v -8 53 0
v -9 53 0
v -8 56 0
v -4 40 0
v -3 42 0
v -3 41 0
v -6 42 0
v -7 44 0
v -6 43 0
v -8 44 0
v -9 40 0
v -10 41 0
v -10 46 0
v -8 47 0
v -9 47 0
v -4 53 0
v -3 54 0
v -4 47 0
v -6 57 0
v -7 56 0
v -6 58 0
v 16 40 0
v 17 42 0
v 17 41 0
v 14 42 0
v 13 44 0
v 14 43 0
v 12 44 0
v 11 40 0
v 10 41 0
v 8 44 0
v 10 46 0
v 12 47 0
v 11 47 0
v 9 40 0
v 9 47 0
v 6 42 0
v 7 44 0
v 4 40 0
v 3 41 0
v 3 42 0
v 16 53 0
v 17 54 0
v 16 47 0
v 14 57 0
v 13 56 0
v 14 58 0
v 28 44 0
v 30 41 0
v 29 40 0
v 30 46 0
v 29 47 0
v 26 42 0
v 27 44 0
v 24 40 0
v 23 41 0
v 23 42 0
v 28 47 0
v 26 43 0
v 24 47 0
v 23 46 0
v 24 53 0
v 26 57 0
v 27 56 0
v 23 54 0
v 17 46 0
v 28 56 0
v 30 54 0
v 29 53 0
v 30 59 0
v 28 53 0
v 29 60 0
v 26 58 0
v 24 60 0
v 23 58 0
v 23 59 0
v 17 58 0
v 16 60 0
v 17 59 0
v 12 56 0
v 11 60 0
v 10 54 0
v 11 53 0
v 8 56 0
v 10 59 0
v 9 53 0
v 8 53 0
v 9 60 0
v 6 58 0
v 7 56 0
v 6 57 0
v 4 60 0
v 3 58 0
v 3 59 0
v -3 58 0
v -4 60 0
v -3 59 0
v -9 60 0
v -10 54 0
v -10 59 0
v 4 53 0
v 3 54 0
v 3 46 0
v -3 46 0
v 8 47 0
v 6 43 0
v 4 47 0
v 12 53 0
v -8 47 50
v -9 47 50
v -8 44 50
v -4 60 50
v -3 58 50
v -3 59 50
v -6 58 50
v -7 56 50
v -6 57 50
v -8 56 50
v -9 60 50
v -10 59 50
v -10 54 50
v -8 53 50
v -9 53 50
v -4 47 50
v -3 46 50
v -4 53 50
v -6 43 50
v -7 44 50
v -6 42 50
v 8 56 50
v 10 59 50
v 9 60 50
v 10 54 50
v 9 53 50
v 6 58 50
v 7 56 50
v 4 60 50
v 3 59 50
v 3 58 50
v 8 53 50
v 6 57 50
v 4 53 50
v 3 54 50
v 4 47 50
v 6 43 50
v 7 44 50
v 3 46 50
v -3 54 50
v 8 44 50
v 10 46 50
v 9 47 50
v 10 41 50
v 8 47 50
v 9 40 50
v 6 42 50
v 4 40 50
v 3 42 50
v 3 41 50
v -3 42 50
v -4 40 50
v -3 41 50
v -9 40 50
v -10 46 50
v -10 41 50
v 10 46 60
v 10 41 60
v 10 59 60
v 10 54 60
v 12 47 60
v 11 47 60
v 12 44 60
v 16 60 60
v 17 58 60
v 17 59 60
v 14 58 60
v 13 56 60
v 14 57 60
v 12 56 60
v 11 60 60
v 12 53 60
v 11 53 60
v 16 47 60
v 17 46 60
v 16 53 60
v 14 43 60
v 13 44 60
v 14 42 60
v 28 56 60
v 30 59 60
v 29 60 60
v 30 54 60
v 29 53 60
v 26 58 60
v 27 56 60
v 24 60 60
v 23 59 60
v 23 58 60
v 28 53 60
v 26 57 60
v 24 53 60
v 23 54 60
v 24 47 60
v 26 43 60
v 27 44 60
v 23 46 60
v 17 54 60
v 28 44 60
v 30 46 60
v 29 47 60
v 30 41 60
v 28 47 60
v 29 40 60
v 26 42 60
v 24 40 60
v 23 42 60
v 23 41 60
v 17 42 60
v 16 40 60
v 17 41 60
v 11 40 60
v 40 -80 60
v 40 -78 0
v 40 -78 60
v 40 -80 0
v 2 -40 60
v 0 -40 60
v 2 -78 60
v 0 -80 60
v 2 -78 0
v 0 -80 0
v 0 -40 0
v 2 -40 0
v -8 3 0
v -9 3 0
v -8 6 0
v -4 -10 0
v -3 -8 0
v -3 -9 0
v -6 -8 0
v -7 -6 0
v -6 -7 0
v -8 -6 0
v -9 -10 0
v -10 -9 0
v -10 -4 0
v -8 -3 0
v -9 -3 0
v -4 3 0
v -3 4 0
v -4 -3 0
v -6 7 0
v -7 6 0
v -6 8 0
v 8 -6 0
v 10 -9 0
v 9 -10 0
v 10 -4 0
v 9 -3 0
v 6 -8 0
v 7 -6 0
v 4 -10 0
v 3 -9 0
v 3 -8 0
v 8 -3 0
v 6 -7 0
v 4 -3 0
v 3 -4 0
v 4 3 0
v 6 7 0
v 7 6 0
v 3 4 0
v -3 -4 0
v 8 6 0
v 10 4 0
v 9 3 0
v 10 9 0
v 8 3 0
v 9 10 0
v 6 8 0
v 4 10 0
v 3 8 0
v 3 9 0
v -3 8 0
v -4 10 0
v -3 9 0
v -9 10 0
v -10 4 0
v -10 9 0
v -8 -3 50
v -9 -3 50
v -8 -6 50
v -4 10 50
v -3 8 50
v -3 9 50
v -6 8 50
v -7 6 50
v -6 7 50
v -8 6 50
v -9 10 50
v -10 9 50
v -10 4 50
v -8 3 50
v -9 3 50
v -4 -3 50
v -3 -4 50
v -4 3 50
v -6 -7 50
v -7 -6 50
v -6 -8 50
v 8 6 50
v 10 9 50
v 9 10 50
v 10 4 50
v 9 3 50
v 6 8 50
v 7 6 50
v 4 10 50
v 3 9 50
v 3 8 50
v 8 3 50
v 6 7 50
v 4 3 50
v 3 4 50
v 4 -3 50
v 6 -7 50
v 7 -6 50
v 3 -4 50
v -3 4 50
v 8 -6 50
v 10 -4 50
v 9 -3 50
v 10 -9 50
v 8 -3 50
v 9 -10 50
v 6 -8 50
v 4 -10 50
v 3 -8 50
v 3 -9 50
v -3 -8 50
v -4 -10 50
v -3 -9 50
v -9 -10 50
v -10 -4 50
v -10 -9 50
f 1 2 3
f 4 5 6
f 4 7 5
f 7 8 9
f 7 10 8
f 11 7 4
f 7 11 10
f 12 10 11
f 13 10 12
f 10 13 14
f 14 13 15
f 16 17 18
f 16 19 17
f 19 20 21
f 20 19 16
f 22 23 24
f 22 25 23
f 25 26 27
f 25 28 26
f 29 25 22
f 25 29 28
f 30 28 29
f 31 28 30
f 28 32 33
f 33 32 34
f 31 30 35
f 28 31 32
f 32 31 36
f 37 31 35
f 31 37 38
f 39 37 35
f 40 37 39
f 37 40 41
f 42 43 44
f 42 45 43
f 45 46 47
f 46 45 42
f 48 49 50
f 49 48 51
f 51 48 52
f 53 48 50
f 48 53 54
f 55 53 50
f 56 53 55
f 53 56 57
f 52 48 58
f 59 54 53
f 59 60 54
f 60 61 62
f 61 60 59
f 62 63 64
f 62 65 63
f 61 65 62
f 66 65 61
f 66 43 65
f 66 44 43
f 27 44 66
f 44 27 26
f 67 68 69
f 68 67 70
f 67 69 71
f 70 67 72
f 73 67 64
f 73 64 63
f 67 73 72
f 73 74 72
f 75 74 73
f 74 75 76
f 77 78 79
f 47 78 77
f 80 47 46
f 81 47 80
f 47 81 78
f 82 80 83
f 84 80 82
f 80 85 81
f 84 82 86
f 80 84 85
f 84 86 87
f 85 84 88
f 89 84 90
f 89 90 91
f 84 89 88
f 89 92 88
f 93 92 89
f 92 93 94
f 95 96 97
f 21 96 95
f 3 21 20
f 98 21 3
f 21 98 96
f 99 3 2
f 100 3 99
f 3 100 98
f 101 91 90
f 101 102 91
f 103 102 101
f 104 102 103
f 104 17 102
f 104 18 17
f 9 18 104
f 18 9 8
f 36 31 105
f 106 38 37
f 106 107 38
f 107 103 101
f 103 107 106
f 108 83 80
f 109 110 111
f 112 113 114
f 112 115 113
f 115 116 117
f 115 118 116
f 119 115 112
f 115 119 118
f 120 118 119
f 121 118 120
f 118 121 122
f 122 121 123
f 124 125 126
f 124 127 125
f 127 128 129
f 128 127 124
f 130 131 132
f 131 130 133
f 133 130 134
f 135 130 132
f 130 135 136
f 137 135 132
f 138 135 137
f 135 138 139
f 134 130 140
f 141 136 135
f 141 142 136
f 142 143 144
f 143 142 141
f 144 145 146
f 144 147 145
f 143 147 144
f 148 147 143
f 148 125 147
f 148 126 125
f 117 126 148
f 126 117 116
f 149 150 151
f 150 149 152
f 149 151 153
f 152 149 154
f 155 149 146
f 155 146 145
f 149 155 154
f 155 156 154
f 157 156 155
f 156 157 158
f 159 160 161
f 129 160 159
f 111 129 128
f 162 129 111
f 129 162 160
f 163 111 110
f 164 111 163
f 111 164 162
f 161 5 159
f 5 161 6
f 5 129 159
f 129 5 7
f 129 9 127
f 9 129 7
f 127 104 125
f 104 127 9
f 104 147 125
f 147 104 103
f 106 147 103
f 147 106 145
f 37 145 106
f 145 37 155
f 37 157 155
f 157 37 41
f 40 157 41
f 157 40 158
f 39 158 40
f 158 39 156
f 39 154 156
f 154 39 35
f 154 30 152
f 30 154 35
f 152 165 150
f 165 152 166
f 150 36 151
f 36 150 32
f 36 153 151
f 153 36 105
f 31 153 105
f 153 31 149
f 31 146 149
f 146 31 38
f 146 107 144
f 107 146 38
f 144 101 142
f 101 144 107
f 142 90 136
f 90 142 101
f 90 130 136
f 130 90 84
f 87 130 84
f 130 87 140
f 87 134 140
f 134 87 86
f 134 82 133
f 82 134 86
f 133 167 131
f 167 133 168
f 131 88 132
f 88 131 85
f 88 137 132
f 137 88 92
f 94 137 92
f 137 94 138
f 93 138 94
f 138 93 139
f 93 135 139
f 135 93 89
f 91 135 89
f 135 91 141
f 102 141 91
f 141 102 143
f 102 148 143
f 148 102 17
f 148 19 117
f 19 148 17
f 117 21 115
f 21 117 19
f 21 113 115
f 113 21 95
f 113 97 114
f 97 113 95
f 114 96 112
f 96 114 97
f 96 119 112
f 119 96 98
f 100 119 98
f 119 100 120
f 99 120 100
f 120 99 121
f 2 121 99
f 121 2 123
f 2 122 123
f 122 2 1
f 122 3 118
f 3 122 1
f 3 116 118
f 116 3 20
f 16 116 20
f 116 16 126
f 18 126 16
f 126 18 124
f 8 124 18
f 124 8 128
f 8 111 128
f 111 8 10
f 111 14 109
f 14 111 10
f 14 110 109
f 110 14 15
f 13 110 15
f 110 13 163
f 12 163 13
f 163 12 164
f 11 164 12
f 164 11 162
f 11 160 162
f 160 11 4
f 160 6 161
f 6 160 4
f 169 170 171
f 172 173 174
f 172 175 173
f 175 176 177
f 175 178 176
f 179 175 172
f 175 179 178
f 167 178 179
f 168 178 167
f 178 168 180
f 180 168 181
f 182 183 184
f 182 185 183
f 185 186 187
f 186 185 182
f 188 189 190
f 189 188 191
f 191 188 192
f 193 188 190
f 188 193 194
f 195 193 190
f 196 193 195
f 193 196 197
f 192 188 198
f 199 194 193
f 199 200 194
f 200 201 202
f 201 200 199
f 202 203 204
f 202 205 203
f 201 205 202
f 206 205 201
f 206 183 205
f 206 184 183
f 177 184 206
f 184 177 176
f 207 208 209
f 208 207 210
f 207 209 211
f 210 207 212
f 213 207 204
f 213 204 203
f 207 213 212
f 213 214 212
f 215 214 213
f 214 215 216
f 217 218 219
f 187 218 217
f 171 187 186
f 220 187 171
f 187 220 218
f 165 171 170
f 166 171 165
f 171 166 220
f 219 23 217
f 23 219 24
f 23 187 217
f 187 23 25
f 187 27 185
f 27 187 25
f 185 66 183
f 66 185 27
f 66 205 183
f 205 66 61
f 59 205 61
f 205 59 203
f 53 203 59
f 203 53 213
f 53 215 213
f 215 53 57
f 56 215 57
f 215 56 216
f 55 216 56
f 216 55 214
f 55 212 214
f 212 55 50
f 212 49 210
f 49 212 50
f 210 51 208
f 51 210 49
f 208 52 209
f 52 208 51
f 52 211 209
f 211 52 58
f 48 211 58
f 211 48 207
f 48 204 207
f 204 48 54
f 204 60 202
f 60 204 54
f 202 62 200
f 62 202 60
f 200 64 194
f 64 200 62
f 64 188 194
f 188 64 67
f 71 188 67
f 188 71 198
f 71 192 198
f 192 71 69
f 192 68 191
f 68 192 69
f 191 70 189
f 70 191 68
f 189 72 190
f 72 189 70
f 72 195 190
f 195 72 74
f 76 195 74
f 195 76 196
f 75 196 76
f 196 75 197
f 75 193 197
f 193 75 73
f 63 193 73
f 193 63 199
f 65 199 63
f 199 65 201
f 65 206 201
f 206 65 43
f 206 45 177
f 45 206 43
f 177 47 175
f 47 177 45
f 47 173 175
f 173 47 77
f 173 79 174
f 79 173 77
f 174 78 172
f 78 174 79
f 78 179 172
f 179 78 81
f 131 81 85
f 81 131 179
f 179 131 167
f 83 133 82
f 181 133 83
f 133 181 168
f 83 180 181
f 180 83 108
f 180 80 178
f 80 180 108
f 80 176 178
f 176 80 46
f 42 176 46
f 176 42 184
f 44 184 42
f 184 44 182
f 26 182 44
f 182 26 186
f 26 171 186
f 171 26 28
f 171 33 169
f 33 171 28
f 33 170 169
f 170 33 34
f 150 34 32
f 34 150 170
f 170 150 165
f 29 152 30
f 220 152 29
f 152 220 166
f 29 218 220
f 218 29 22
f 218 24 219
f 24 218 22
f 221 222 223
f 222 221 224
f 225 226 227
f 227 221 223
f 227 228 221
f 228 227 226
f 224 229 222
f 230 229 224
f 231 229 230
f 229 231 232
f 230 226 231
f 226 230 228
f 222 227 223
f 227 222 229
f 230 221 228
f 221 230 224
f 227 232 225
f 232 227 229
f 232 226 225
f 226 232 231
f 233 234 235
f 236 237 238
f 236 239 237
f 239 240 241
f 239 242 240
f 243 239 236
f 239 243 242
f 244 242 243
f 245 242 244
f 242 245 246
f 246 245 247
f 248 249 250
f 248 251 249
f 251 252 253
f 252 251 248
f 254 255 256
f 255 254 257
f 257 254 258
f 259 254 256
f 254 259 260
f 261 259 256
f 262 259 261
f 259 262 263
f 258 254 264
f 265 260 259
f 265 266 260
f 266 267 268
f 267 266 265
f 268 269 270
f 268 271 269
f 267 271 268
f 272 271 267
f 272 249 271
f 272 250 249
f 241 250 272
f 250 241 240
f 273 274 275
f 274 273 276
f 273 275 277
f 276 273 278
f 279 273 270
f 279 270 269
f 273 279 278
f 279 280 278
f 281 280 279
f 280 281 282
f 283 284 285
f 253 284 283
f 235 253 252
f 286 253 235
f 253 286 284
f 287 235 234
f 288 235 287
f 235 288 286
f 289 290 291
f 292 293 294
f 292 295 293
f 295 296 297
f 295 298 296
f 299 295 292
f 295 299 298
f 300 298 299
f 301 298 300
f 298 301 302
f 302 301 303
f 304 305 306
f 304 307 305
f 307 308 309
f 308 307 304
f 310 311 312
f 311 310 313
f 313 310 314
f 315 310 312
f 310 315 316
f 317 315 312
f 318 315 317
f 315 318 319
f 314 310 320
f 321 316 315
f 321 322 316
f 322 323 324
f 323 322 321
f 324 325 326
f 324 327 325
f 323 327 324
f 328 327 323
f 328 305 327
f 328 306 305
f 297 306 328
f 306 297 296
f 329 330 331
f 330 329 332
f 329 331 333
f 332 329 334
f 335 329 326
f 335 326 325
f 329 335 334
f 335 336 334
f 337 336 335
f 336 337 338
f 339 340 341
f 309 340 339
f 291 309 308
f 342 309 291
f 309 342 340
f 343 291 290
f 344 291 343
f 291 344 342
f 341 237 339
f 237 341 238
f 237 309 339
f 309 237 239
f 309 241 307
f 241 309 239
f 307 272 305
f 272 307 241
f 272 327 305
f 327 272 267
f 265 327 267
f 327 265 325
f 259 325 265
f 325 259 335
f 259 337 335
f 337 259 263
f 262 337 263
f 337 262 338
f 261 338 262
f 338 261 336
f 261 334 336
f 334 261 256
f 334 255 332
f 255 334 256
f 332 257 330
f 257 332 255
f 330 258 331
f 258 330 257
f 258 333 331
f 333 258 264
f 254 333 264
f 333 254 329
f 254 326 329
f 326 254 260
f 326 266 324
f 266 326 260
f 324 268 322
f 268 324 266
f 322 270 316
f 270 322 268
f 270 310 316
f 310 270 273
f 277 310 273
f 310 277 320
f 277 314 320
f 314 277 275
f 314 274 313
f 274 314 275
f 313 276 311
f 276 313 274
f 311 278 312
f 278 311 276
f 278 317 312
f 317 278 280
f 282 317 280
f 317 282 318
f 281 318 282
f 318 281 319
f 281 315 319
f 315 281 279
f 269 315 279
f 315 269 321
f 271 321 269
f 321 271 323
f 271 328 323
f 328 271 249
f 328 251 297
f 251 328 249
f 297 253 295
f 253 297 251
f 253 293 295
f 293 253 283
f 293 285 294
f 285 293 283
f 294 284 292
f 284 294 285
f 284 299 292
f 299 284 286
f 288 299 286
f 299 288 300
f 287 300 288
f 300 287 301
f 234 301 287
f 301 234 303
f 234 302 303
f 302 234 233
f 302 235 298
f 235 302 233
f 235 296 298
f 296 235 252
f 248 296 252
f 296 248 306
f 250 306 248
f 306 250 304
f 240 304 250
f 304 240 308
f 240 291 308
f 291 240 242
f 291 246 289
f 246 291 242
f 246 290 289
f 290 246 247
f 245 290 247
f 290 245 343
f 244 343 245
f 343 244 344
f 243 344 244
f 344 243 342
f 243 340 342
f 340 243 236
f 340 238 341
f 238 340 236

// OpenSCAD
// file: ../utils.scad
//Utils
include <config.scad>;

module MOV(mov)
{
    translate(mov)
        children();
}

module ROT(rot)
{
    rotate(rot)
        children();
}

module ROT_MOV(rot, mov)
{
    rotate(rot) 
        translate(mov)
            children();
}

module MOV_ROT(mov, rot)
{
    translate(mov)
        rotate(rot) 
            children();
}

function MULT2MV (m, v) = 
[
    m[0][0]*v[0] + m[0][1]*v[1],
    m[1][0]*v[0] + m[1][1]*v[1],
];

function ROTM2(angle) = 
[
    [cos(angle), -sin(angle)],
    [sin(angle), cos(angle)]
];

function X(x) = [x, 0, 0];

function Y(y) = [0, y, 0];

function Z(z) = [0, 0, z];
// file: ../config.scad
// Config
$fn=90;
// SIZE
// FRAME SIZE
FRAME_SZ = [520, 460, 500];
FRAME_X = FRAME_SZ[0];
FRAME_Y = FRAME_SZ[1];
FRAME_Z = FRAME_SZ[2];

// BED SIZE
BED_SZ = [314, 214, 3];
BED_X = BED_SZ[0];
BED_Y = BED_SZ[1];
BED_Z = BED_SZ[2];
GLASS_SZ = [BED_X, BED_Y, 4];
BED_SCREW_D = 3;
BED_SCREW_OFFSET = 5;
// TABLE SIZE
TABLE_SZ = [330, 350, 22];
TABLE_X = TABLE_SZ[0];
TABLE_Y = TABLE_SZ[1];
TABLE_Z = TABLE_SZ[2];
// RODS
TABLE_ROD_H = FRAME_Z-20;
TABLE_ROD_D = 12;
TABLE_ROD_MOUNT_W = 4;
Z_SCREW_H = FRAME_Z-20;
Z_SCREW_D = 8;
Z_SCREW_HOLE = 11;
Z_SCREW_MOUNT_W = 6;
Y_ROD_H = FRAME_X;
Y_ROD_D = 8;
// RAILS
RAIL_X_OFFSET = 30;
RAIL_X = FRAME_X-40-2*RAIL_X_OFFSET;
RAIL_Y = FRAME_Y-40;
RAIL_P = 20;
RAIL_W = 9;
RAIL_H = 6.5;
// CARET
MGN9C_SZ=[28.9,20,8];
MGN9C_X=MGN9C_SZ[0];
MGN9C_Y=MGN9C_SZ[1];
MGN9C_Z=MGN9C_SZ[2];
MGN9C_H=2;
// COLORS
MOTORS_COLOR = "DimGrey";
PROFILE_COLOR = "Silver";
ROD_COLOR = "WhiteSmoke";
BED_COLOR = "Red";
GLASS_COLOR = [0.25, 0.75, 0.75, 0.25];
BRONZE_COLOR = "Goldenrod";
MGN9C_COLOR = "DarkGreen";
// VECTORS
ZERO = [0, 0, 0];
// main file
// Profile
include <../config.scad>;
use <../utils.scad>;

PROFILE2020(50);
MOV(Y(50)) PROFILE4020(50, 60);
MOV(Y(-80)) CORNER40402(60);

module CORNER40402(length, w=40, h=40)
{
    color(PROFILE_COLOR)
        union(){
            cube([w, 2, length]);
            cube([2, h, length]);
        }
}


module PROFILE2020(length){
    color(PROFILE_COLOR)
        linear_extrude(height=length, slices=1)
            CONTOUR2020();
    echo (str("PROFILE 20x20x",length));
    
}

module PROFILE4020(length, length2=-1){
    color(PROFILE_COLOR){
        linear_extrude(height=length, slices=1){
            CONTOUR2020();
        }
        linear_extrude(height=(length2<0?length:length2), slices=1){
            MOV(X(20)) CONTOUR2020();
        }
    }
    echo (str("PROFILE 40x20x",(length>length2?length:length2)));
}


module CONTOUR2020(){
    points1 = [
        [3,4],
        [6,7],
        [6,8],
        [3,8],
        [3,9],
        [4,10],
        [9,10],
        [10,9],
        [10,4],
        [9,3],
        [8,3],
        [8,6],
        [7,6],
        [4,3]
    ];
    points2 = [ for(i =[ 0: len(points1) - 1]) MULT2MV(ROTM2(-90), points1[i]) ];
    points3 = [ for(i =[ 0: len(points1) - 1]) MULT2MV(ROTM2(-180), points1[i]) ];
    points4 = [ for(i =[ 0: len(points1) - 1]) MULT2MV(ROTM2(-270), points1[i]) ];
    polygon(concat(points1, points2, points3, points4));
}
